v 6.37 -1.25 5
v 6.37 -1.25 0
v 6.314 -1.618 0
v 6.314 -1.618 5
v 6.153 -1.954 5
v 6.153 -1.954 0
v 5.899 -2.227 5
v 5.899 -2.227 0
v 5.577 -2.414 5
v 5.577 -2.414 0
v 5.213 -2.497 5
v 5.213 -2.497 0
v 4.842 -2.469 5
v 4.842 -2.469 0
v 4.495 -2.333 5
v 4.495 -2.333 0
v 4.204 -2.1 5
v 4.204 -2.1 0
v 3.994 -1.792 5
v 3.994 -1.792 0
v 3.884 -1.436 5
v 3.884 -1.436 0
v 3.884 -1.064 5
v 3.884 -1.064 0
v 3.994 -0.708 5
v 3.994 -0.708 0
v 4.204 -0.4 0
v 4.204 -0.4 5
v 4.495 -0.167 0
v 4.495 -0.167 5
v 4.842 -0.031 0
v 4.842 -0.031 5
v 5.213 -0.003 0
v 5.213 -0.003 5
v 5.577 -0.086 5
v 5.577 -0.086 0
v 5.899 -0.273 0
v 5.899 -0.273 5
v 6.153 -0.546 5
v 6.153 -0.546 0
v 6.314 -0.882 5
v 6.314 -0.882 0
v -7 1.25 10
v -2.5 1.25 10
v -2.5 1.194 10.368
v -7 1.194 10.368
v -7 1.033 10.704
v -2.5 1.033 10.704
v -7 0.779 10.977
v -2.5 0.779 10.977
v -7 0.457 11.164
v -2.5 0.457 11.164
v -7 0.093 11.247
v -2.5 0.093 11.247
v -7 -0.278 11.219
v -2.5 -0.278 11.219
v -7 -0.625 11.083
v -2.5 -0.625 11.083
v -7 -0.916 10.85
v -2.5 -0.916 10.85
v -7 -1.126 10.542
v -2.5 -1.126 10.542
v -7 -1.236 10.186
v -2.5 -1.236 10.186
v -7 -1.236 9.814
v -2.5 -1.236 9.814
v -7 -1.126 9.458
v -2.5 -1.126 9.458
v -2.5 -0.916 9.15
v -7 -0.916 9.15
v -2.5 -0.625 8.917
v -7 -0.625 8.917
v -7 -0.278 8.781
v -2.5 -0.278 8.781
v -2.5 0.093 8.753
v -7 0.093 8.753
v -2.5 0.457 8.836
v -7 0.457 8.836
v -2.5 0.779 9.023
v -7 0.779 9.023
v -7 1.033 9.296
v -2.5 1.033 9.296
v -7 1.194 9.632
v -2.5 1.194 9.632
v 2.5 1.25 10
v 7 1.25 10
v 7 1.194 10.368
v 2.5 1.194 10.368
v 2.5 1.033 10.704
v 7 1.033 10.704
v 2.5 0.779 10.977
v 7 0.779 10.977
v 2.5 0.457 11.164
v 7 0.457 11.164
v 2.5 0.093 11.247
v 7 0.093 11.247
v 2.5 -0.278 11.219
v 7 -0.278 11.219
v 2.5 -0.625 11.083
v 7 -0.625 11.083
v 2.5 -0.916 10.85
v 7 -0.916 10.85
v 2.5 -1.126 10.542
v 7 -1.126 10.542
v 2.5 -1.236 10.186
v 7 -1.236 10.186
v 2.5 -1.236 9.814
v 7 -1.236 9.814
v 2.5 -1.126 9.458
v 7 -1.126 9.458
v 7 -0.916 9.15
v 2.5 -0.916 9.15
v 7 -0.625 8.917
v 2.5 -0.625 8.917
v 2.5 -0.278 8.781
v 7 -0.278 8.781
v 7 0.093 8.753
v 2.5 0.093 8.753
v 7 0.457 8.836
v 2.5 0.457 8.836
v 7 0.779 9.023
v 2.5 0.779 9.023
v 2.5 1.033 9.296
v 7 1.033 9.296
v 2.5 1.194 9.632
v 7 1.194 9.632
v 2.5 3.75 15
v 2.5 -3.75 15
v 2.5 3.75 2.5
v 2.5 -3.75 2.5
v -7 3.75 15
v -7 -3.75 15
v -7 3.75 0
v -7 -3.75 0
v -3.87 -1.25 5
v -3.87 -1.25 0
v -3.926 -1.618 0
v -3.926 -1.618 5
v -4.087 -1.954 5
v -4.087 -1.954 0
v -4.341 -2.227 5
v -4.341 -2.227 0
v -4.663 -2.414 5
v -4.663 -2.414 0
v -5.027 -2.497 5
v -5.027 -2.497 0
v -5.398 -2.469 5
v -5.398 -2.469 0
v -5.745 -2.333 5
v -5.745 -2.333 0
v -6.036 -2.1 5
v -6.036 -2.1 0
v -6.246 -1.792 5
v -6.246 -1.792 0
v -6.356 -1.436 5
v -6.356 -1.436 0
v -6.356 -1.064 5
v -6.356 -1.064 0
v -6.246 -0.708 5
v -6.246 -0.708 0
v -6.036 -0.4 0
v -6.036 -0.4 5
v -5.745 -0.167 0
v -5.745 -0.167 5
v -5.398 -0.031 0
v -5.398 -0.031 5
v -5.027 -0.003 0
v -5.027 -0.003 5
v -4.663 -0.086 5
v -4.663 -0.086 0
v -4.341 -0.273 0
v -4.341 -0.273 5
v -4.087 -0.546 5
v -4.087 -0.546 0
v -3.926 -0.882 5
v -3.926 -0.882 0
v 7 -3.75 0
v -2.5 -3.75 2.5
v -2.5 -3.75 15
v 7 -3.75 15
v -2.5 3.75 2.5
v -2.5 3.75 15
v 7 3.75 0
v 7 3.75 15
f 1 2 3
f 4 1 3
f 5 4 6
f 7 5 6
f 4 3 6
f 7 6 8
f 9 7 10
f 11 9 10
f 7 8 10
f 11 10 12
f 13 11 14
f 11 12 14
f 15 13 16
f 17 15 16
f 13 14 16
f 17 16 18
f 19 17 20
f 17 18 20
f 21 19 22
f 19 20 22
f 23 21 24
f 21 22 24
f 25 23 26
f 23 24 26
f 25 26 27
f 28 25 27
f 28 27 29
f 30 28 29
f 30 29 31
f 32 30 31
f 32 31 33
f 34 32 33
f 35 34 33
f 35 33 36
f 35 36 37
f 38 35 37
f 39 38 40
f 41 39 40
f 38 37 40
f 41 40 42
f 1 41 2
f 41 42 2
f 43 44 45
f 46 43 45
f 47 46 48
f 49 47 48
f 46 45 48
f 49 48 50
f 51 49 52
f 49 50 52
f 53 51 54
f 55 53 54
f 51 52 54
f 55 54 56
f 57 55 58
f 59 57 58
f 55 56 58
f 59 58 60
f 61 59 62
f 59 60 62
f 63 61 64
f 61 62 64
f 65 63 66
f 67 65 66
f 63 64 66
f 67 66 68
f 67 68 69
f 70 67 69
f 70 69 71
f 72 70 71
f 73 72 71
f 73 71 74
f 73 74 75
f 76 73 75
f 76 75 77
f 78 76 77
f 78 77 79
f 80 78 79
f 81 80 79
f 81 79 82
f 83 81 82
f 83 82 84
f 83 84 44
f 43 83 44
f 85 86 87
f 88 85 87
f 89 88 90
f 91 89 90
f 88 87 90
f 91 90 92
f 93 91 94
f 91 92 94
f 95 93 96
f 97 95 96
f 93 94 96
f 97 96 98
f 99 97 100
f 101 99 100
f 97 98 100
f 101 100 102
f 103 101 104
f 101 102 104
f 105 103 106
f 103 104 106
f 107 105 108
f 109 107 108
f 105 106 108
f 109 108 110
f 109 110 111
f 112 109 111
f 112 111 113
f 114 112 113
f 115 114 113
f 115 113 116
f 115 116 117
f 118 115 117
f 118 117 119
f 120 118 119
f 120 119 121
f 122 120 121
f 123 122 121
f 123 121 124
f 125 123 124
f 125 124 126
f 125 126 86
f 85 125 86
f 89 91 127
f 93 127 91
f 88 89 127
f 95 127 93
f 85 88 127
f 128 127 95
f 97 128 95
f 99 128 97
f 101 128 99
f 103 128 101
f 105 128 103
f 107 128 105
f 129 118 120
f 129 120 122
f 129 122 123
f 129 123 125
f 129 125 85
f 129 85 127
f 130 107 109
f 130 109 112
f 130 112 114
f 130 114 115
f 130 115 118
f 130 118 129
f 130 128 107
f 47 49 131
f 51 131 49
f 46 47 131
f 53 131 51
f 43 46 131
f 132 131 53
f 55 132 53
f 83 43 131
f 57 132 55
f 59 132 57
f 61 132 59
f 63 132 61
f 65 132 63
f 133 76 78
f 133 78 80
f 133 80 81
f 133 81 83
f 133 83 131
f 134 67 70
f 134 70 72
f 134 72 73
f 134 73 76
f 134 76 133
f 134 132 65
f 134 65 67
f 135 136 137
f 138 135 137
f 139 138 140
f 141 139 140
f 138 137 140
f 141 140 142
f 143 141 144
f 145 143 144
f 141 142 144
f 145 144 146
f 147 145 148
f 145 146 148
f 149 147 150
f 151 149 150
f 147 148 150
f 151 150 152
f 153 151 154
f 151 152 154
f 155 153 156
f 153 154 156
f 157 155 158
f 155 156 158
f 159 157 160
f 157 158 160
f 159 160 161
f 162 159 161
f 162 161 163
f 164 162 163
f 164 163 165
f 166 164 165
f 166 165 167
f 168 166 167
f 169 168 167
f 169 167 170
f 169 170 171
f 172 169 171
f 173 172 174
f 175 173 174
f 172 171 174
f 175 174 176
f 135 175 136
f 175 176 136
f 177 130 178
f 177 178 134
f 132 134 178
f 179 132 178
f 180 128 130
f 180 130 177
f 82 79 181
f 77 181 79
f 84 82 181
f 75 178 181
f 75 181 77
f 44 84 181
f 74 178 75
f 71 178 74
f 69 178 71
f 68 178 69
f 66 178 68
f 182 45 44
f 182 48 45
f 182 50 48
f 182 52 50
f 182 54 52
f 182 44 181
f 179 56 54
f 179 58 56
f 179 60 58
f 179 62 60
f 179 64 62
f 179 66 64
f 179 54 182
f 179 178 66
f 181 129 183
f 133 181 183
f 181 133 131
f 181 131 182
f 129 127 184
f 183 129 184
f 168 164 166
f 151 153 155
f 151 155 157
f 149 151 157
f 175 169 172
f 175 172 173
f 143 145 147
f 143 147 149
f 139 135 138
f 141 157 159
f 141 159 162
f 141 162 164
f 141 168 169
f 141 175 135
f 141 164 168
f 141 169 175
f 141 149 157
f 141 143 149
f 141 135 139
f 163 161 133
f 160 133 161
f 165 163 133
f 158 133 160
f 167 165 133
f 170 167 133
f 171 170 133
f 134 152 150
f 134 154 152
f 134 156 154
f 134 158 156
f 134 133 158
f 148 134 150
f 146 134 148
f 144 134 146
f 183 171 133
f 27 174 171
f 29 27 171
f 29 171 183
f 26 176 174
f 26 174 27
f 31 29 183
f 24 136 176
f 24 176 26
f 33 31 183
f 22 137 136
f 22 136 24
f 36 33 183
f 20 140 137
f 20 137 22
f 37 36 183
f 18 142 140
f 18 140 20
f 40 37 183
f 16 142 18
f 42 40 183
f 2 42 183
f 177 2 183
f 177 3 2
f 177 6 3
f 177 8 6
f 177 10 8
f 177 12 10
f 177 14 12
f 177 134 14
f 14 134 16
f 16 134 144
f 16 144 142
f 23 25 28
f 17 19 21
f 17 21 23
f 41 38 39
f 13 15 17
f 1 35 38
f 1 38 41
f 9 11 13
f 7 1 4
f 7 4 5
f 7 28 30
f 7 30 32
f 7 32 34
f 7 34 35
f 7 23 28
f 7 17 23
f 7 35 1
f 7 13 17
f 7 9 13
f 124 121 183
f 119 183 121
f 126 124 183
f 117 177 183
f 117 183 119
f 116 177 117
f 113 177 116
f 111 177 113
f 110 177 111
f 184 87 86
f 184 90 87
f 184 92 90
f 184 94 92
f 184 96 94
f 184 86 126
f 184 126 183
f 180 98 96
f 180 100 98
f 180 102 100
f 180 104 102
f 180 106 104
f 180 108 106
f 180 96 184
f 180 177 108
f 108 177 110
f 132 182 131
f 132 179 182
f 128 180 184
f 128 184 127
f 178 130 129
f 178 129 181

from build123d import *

# Parameters (mm, degrees)
F1_DEPTH = 3.75
F2_R     = 1.25
F3_DEPTH = 25
F4_R     = 1.25
F5_DEPTH = 5


with BuildPart() as f1:
    # F0 (on Front) → F1 (new body, symmetric)
    with BuildSketch(Plane.XZ):
        Polygon((-7, 0), (0, 0), (7, 0), (7, 15), (2.5, 15), (2.5, 2.5), (-2.5, 2.5), (-2.5, 15), (-7, 15), align=None)
    extrude(amount=F1_DEPTH, both=True)

    # F2 (on face) → F3 (cut)
    with BuildSketch(Plane.YZ.offset(7)):
        with Locations((0, 10)):
            Circle(F2_R)
    extrude(amount=-F3_DEPTH, mode=Mode.SUBTRACT)

    # F4 (on face) → F5 (cut)
    with BuildSketch(Plane(origin=(0, 0, 0), x_dir=(1, 0, 0), z_dir=(0, 0, -1))):
        with Locations((5.12, 1.25)):
            Circle(F4_R)
        with Locations((-5.12, 1.25)):
            Circle(F4_R)
    extrude(amount=-F5_DEPTH, mode=Mode.SUBTRACT)


solid = f1.part
